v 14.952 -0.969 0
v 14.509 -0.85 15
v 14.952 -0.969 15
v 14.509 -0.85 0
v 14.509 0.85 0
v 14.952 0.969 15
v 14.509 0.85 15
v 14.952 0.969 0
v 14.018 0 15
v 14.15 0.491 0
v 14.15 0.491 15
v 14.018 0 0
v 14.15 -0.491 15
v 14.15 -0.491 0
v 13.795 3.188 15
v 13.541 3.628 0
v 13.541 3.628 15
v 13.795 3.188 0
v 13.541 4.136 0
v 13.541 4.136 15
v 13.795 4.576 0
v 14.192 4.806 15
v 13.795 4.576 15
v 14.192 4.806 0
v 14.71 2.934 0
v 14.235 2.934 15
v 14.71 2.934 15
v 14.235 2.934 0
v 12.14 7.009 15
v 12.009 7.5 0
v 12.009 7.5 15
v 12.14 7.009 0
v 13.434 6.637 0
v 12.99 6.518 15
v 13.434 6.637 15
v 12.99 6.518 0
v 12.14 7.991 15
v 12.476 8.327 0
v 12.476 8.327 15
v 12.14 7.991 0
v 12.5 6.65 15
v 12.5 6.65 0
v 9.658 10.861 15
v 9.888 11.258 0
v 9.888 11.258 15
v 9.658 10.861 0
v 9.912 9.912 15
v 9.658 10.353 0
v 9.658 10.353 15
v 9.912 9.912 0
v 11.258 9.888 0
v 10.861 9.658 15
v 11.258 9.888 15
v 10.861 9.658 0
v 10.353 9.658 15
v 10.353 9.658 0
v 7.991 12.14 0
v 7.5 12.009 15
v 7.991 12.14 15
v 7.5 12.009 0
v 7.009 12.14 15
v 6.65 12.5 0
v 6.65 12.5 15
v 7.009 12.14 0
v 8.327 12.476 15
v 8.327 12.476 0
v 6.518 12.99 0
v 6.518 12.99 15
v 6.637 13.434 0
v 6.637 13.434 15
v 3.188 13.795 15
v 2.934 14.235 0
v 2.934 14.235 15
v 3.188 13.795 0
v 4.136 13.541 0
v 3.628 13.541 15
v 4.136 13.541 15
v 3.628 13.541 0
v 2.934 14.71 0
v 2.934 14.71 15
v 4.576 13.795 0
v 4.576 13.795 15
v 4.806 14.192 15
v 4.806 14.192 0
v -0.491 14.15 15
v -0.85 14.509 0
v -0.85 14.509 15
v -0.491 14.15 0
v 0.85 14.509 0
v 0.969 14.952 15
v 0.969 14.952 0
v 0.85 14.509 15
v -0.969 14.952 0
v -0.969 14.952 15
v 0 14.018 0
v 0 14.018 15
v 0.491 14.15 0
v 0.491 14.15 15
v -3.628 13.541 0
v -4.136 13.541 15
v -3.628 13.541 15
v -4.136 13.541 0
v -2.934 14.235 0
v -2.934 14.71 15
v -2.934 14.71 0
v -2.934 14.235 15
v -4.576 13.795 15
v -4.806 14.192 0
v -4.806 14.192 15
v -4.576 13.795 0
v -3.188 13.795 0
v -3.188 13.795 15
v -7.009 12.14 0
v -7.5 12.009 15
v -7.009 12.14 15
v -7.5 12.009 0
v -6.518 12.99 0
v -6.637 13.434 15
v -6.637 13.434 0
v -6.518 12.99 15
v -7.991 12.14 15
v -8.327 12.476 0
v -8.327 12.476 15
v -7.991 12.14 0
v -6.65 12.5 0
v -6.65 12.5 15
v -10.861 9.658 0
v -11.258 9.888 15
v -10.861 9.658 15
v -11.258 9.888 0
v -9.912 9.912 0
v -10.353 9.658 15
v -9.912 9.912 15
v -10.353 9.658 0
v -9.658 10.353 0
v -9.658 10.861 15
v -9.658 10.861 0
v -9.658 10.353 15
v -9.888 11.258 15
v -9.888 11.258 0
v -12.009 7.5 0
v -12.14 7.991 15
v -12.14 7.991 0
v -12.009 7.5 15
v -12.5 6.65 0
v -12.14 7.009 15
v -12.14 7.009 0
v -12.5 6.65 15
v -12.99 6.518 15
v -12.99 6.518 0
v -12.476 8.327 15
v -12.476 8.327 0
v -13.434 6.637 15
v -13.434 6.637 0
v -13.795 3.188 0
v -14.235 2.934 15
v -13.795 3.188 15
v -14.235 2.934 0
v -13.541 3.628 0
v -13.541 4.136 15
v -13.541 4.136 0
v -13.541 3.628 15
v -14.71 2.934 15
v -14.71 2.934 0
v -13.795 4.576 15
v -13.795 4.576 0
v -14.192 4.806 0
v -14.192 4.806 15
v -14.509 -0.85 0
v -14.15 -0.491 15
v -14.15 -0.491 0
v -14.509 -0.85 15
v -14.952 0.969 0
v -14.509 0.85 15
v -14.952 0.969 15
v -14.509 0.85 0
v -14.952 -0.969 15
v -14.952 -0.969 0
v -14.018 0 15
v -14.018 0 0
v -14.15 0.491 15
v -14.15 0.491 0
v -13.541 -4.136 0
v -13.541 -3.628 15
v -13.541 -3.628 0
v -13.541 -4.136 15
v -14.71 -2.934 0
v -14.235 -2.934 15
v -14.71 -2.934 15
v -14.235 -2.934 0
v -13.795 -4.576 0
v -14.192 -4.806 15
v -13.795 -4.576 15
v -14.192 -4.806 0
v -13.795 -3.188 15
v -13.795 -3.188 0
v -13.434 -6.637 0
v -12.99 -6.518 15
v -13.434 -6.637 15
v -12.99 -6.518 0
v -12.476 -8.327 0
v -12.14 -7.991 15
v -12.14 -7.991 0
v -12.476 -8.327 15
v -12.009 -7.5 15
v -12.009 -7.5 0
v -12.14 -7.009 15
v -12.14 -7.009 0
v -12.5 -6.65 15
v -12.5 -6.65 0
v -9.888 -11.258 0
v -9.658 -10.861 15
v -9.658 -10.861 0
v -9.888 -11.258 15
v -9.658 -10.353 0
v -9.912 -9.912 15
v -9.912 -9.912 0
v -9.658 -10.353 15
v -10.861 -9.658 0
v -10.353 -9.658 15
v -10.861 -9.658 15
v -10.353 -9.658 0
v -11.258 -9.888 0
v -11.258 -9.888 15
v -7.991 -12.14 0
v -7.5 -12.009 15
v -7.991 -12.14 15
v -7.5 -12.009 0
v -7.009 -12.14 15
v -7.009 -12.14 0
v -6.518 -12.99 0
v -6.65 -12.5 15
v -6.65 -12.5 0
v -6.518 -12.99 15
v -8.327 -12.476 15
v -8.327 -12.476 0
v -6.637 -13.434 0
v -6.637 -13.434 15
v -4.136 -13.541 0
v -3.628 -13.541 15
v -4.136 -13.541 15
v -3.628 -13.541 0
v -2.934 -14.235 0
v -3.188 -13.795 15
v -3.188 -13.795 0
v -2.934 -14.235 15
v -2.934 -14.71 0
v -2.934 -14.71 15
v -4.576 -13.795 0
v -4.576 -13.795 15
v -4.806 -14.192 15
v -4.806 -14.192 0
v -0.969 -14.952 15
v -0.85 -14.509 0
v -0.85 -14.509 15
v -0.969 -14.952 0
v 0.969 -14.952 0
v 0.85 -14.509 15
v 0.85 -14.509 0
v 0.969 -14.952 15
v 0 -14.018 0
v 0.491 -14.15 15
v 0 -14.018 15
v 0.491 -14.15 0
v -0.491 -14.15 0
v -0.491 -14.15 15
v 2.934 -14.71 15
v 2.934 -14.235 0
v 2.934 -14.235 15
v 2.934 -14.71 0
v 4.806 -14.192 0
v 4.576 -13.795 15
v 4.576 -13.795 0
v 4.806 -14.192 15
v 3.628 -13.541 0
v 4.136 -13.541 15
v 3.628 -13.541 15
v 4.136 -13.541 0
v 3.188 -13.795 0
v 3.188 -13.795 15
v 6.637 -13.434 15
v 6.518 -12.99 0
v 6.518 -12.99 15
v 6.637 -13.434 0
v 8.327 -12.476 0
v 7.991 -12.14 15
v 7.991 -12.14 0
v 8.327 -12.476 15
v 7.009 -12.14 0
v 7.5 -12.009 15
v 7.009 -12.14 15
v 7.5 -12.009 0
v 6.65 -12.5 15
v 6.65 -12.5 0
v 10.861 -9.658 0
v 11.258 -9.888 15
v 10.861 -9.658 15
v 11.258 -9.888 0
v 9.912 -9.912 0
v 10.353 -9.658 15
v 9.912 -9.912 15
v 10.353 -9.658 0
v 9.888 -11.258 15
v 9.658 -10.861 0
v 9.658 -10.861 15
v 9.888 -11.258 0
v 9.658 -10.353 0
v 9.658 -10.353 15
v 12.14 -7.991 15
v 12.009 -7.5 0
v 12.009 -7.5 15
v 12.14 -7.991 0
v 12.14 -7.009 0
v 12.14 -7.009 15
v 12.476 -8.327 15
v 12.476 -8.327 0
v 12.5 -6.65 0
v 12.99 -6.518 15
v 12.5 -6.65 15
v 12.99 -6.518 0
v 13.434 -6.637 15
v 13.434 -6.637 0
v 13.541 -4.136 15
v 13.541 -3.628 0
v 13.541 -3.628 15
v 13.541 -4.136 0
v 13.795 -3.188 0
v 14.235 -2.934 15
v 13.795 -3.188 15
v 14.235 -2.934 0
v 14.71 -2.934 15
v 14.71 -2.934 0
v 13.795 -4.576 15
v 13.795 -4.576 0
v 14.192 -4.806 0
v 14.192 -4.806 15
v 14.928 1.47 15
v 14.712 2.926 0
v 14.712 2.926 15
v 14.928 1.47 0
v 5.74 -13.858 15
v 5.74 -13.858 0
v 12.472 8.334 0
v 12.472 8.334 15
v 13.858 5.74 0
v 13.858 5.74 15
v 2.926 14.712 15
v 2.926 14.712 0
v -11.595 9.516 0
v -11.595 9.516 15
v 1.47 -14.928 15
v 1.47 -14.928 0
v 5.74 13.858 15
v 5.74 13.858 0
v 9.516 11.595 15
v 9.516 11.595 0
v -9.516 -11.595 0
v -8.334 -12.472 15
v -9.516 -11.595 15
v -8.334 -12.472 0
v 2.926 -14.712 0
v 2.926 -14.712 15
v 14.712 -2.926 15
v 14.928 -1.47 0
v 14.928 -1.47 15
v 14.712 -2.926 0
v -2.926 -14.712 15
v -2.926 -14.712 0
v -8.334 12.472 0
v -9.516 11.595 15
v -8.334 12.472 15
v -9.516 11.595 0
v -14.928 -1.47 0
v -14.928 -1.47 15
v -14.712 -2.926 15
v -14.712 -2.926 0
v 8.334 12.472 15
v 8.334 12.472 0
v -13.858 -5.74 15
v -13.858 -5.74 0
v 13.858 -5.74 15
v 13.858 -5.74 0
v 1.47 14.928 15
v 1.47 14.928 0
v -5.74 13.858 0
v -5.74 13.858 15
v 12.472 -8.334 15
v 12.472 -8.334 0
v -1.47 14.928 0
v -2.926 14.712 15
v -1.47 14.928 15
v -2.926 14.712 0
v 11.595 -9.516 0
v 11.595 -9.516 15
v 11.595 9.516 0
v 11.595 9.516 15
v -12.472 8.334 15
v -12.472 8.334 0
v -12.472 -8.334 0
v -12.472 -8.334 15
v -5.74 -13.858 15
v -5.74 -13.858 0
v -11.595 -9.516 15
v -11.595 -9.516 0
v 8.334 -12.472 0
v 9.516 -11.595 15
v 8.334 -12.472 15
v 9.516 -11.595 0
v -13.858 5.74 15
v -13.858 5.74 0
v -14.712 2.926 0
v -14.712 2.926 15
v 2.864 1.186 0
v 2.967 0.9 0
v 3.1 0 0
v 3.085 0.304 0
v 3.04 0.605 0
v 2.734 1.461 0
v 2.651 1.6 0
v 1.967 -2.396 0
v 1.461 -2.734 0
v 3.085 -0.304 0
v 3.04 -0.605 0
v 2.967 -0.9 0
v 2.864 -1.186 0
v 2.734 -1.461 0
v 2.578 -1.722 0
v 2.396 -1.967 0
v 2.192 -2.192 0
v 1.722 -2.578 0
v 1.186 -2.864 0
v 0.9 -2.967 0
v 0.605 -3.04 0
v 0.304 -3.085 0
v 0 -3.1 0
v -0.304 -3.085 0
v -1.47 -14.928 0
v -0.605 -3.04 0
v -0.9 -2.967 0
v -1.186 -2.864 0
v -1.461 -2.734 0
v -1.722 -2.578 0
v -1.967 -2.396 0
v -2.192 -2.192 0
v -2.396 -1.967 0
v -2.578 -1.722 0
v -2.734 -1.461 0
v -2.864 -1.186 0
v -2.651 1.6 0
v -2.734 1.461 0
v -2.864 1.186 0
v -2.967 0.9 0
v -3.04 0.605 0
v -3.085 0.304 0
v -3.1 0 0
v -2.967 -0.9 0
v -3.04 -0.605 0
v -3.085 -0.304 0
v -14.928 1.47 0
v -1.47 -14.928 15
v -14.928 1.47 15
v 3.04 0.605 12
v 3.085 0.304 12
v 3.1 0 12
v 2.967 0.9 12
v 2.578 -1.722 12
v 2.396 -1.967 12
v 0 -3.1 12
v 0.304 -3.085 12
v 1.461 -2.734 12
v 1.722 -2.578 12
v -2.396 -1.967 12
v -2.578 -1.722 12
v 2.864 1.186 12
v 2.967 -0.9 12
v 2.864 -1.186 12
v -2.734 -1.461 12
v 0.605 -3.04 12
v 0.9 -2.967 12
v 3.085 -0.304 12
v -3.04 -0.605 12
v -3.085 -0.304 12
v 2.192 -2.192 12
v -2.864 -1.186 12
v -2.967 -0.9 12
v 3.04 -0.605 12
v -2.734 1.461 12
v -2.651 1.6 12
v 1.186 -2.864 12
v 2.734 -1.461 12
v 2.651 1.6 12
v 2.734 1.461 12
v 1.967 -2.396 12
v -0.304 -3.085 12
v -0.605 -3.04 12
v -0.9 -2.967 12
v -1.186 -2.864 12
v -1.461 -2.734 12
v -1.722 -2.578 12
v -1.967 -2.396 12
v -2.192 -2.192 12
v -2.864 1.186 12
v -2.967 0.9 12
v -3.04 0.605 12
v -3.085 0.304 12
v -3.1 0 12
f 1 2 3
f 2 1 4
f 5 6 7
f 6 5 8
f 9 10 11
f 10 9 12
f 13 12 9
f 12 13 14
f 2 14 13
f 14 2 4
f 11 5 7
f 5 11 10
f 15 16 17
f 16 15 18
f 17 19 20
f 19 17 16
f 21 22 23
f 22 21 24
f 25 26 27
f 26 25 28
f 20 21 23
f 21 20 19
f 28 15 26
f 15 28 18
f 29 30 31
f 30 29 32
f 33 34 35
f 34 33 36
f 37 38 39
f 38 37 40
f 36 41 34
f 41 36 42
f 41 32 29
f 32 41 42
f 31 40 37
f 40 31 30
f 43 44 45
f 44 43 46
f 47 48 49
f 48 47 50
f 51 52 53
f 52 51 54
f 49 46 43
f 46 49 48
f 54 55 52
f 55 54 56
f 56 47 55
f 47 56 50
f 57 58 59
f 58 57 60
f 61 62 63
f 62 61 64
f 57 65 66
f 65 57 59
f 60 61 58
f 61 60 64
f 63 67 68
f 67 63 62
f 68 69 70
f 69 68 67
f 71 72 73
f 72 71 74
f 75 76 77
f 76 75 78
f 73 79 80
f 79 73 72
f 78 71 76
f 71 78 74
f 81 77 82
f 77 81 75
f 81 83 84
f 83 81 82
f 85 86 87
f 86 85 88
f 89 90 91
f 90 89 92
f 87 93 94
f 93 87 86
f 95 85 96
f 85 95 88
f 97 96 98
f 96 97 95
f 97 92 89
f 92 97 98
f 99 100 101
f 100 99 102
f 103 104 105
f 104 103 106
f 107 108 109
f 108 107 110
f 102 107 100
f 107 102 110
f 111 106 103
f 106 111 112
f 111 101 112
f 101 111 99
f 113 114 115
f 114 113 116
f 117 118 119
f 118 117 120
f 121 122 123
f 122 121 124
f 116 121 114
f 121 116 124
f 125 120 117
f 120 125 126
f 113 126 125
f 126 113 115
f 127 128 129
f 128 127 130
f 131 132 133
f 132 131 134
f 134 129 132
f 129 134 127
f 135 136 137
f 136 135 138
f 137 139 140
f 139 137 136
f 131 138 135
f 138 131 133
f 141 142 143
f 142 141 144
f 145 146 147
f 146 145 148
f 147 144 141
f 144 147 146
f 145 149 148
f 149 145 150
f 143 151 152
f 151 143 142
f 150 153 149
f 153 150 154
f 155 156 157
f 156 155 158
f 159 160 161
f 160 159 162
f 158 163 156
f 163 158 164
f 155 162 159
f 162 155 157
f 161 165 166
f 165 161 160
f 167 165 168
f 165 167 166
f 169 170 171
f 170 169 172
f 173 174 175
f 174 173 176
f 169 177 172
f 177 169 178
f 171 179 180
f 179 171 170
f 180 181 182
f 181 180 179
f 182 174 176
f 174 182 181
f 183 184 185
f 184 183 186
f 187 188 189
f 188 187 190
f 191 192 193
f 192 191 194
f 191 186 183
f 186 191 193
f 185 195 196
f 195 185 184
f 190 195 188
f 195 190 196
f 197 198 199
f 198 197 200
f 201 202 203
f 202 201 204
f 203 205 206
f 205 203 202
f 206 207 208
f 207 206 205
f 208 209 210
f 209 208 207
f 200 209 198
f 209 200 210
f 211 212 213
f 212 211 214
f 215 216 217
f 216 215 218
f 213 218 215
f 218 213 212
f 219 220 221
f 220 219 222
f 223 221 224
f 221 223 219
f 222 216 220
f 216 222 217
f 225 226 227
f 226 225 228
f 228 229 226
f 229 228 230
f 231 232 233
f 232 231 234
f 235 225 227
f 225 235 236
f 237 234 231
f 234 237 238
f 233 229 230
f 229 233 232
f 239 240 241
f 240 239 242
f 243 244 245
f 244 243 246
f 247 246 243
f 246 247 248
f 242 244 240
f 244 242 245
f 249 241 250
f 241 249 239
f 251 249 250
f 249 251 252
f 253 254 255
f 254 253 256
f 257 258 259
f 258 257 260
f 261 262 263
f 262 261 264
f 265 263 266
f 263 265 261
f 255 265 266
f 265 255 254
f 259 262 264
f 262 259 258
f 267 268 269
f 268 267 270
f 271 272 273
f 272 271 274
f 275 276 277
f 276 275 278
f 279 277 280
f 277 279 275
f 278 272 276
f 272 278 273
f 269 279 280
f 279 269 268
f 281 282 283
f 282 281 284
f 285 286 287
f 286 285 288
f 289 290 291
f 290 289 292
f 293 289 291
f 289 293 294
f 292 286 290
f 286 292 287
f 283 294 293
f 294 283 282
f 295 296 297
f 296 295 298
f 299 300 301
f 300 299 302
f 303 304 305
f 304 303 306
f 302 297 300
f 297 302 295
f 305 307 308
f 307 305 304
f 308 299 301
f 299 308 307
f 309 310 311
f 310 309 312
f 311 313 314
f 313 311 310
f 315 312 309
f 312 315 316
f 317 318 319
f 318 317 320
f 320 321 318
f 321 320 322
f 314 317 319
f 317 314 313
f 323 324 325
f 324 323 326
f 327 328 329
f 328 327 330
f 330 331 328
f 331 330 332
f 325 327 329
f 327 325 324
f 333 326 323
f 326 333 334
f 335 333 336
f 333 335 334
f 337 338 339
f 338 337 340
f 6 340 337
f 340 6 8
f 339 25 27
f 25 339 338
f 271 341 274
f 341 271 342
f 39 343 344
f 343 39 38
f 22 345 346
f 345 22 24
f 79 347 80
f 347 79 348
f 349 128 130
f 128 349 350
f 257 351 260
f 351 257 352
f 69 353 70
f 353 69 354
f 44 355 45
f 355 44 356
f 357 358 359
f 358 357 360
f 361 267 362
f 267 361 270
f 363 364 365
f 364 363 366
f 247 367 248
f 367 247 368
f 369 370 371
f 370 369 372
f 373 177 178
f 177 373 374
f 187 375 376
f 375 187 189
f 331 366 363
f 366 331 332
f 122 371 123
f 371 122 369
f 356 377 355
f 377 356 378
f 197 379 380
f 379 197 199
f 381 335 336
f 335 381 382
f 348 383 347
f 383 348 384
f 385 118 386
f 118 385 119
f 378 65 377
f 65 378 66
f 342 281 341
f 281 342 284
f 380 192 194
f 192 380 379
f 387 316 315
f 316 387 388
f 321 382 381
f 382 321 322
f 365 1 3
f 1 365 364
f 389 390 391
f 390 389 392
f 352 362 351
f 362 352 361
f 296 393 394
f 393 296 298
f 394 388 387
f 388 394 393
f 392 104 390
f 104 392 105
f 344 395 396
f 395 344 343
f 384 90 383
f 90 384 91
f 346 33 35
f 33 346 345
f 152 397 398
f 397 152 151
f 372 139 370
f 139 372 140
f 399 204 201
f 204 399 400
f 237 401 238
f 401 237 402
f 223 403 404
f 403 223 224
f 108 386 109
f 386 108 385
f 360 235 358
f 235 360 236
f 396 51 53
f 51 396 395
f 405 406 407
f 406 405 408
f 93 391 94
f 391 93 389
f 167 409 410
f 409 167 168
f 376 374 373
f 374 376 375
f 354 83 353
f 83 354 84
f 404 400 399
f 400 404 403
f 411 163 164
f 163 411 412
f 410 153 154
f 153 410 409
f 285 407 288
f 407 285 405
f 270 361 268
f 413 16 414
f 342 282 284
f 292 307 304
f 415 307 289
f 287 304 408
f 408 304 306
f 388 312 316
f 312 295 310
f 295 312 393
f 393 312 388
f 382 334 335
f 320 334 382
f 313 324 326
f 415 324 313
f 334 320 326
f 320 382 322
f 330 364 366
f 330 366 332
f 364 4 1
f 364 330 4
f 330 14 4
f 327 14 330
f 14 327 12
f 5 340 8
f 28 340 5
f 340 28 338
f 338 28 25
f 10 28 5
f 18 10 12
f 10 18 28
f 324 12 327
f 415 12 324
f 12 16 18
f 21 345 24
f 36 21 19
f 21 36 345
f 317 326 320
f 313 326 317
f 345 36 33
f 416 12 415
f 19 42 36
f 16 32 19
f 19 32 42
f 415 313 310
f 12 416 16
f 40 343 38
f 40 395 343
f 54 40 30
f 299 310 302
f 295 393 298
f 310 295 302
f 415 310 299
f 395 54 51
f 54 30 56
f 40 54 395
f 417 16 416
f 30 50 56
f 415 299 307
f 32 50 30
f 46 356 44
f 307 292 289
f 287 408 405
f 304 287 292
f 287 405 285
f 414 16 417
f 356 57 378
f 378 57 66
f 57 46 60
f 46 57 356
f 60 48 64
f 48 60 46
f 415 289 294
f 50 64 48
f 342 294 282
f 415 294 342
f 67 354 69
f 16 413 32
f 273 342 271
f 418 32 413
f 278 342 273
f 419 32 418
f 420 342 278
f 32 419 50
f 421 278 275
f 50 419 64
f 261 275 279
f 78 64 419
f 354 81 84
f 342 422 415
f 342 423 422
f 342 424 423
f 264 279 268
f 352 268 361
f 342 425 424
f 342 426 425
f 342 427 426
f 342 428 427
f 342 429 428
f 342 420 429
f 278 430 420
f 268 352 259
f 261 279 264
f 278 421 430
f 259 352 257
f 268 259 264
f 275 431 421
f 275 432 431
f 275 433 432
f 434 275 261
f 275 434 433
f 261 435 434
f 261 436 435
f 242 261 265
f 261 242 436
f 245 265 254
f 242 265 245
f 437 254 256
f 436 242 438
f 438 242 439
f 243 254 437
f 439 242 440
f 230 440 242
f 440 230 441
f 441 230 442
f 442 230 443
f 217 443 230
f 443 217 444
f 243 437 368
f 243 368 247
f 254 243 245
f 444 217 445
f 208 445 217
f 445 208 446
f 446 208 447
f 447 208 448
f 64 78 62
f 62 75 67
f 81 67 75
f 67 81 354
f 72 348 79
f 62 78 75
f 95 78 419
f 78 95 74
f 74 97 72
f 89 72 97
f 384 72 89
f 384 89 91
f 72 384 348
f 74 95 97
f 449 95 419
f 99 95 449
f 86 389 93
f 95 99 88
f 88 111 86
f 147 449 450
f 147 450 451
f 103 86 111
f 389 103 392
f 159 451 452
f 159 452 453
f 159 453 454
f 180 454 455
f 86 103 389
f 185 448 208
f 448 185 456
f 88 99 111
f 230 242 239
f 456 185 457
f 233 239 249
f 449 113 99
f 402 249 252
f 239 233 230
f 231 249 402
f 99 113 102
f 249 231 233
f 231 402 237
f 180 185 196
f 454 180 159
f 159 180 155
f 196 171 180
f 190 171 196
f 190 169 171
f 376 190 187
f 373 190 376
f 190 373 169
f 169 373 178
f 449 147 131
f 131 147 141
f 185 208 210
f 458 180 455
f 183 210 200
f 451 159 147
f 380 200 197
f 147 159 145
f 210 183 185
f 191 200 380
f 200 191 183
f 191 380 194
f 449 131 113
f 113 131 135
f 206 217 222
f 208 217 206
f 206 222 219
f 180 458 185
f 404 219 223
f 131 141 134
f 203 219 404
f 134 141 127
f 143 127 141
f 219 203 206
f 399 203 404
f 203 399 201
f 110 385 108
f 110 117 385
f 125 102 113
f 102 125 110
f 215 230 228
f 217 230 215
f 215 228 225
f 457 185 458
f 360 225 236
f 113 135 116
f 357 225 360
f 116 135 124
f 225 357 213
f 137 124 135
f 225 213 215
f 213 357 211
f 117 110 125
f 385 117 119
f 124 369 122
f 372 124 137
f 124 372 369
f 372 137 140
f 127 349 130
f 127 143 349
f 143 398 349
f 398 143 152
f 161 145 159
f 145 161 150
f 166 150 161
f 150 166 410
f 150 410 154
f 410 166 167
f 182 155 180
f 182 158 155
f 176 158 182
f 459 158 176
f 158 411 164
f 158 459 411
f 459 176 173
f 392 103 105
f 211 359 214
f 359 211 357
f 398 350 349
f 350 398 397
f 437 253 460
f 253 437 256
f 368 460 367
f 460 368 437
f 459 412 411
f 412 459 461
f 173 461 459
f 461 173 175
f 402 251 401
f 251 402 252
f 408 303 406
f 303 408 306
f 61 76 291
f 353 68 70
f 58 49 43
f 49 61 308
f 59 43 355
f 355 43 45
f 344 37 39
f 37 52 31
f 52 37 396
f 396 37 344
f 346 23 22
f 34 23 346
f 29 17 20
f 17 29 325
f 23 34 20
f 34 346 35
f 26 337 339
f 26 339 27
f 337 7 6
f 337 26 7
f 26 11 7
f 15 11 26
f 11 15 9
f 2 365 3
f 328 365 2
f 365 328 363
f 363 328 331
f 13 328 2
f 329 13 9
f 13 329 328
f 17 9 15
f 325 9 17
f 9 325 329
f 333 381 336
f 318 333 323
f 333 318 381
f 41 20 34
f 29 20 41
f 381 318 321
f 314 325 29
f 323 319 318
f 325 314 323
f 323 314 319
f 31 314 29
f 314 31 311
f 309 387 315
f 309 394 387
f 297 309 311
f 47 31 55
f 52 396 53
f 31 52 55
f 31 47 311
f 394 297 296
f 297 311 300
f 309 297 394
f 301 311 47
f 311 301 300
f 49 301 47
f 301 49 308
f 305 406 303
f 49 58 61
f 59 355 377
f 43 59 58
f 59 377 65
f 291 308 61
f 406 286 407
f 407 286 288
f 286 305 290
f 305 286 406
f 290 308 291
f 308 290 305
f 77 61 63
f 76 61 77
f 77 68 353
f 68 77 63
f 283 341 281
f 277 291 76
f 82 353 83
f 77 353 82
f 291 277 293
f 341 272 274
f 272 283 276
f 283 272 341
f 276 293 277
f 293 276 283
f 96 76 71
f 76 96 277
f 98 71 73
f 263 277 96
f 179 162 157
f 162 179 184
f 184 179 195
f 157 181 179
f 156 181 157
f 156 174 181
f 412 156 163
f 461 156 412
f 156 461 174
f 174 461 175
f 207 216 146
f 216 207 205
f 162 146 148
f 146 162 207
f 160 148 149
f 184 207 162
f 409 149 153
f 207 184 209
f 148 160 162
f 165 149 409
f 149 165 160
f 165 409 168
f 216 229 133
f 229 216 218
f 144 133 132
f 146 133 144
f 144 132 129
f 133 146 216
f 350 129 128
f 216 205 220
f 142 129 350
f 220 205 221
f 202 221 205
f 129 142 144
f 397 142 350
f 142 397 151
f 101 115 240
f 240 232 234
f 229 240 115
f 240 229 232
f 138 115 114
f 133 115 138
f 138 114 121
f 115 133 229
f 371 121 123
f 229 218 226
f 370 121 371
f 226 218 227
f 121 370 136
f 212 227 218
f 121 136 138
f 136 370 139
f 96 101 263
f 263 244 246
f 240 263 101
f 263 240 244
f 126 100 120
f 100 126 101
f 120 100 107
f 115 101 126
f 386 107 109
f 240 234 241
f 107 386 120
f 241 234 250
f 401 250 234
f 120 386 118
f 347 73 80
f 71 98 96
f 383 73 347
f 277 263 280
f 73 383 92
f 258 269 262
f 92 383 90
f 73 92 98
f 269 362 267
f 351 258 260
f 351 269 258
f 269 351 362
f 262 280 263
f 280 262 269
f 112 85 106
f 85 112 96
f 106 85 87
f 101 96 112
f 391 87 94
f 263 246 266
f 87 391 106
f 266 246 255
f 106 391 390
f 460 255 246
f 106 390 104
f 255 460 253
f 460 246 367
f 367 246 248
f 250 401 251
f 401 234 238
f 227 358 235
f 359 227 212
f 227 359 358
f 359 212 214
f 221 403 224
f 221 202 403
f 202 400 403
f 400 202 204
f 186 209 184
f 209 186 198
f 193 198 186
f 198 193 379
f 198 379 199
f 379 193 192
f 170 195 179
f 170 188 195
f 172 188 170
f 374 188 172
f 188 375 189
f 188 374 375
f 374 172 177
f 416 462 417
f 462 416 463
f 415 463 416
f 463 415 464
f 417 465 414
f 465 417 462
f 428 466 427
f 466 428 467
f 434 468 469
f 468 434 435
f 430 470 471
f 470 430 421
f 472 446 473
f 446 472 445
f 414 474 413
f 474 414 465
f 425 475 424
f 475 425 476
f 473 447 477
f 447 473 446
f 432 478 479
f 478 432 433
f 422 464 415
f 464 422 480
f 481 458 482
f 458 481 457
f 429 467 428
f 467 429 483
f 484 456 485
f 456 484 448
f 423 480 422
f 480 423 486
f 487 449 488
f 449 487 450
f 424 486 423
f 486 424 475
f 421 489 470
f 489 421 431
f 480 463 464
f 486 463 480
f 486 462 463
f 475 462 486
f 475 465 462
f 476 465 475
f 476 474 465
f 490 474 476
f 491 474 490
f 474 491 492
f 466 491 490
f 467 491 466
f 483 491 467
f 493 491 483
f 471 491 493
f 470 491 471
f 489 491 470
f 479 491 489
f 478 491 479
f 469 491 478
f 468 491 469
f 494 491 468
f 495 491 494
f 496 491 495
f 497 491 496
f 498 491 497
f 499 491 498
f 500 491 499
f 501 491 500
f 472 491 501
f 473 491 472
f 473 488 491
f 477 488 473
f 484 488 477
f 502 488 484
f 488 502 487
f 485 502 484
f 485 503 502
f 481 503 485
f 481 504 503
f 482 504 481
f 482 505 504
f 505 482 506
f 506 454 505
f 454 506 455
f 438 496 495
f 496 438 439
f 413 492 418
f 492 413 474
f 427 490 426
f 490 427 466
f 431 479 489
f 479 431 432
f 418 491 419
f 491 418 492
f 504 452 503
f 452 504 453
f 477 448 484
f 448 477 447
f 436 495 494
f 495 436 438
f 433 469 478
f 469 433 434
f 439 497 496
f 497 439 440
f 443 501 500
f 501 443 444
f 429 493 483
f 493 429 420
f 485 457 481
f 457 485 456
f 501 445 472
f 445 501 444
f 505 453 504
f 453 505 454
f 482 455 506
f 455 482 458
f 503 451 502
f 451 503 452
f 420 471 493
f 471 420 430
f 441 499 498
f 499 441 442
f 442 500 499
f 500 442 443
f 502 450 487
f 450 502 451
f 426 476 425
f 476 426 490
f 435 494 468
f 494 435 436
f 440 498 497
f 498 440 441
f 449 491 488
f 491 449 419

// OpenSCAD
// Knob
// A ridged knob for a D-shaft potentiometer or encoder.

/* [Knob] */
// Outer diameter (mm)
diameter = 30; // [12:1:80]
// Height (mm)
height = 15; // [6:1:40]
// Number of grip ridges
grip_ridges = 24; // [8:1:60]

/* [Shaft] */
// Shaft diameter (mm)
shaft_diameter = 6; // [3:0.1:10]
// Depth of the flat on the D-shaft (mm)
flat_depth = 1.5; // [0:0.1:3]

/* [Hidden] */
clearance = 0.2;
top = 3;
$fn = 64;

module body() {
  ridge = diameter * PI / grip_ridges / 2;
  difference() {
    cylinder(h = height, d = diameter);
    for (i = [0:grip_ridges - 1])
      rotate([0, 0, i * 360 / grip_ridges])
        translate([diameter / 2, 0, -1])
          cylinder(h = height + 2, d = ridge, $fn = 12);
  }
}

module shaft_hole() {
  d = shaft_diameter + clearance;
  translate([0, 0, -1])
    intersection() {
      cylinder(h = height - top + 1, d = d);
      translate([-d, -d, -1])
        cube([2 * d, d + d / 2 - flat_depth, height + 2]);
    }
}

difference() {
  body();
  shaft_hole();
}
